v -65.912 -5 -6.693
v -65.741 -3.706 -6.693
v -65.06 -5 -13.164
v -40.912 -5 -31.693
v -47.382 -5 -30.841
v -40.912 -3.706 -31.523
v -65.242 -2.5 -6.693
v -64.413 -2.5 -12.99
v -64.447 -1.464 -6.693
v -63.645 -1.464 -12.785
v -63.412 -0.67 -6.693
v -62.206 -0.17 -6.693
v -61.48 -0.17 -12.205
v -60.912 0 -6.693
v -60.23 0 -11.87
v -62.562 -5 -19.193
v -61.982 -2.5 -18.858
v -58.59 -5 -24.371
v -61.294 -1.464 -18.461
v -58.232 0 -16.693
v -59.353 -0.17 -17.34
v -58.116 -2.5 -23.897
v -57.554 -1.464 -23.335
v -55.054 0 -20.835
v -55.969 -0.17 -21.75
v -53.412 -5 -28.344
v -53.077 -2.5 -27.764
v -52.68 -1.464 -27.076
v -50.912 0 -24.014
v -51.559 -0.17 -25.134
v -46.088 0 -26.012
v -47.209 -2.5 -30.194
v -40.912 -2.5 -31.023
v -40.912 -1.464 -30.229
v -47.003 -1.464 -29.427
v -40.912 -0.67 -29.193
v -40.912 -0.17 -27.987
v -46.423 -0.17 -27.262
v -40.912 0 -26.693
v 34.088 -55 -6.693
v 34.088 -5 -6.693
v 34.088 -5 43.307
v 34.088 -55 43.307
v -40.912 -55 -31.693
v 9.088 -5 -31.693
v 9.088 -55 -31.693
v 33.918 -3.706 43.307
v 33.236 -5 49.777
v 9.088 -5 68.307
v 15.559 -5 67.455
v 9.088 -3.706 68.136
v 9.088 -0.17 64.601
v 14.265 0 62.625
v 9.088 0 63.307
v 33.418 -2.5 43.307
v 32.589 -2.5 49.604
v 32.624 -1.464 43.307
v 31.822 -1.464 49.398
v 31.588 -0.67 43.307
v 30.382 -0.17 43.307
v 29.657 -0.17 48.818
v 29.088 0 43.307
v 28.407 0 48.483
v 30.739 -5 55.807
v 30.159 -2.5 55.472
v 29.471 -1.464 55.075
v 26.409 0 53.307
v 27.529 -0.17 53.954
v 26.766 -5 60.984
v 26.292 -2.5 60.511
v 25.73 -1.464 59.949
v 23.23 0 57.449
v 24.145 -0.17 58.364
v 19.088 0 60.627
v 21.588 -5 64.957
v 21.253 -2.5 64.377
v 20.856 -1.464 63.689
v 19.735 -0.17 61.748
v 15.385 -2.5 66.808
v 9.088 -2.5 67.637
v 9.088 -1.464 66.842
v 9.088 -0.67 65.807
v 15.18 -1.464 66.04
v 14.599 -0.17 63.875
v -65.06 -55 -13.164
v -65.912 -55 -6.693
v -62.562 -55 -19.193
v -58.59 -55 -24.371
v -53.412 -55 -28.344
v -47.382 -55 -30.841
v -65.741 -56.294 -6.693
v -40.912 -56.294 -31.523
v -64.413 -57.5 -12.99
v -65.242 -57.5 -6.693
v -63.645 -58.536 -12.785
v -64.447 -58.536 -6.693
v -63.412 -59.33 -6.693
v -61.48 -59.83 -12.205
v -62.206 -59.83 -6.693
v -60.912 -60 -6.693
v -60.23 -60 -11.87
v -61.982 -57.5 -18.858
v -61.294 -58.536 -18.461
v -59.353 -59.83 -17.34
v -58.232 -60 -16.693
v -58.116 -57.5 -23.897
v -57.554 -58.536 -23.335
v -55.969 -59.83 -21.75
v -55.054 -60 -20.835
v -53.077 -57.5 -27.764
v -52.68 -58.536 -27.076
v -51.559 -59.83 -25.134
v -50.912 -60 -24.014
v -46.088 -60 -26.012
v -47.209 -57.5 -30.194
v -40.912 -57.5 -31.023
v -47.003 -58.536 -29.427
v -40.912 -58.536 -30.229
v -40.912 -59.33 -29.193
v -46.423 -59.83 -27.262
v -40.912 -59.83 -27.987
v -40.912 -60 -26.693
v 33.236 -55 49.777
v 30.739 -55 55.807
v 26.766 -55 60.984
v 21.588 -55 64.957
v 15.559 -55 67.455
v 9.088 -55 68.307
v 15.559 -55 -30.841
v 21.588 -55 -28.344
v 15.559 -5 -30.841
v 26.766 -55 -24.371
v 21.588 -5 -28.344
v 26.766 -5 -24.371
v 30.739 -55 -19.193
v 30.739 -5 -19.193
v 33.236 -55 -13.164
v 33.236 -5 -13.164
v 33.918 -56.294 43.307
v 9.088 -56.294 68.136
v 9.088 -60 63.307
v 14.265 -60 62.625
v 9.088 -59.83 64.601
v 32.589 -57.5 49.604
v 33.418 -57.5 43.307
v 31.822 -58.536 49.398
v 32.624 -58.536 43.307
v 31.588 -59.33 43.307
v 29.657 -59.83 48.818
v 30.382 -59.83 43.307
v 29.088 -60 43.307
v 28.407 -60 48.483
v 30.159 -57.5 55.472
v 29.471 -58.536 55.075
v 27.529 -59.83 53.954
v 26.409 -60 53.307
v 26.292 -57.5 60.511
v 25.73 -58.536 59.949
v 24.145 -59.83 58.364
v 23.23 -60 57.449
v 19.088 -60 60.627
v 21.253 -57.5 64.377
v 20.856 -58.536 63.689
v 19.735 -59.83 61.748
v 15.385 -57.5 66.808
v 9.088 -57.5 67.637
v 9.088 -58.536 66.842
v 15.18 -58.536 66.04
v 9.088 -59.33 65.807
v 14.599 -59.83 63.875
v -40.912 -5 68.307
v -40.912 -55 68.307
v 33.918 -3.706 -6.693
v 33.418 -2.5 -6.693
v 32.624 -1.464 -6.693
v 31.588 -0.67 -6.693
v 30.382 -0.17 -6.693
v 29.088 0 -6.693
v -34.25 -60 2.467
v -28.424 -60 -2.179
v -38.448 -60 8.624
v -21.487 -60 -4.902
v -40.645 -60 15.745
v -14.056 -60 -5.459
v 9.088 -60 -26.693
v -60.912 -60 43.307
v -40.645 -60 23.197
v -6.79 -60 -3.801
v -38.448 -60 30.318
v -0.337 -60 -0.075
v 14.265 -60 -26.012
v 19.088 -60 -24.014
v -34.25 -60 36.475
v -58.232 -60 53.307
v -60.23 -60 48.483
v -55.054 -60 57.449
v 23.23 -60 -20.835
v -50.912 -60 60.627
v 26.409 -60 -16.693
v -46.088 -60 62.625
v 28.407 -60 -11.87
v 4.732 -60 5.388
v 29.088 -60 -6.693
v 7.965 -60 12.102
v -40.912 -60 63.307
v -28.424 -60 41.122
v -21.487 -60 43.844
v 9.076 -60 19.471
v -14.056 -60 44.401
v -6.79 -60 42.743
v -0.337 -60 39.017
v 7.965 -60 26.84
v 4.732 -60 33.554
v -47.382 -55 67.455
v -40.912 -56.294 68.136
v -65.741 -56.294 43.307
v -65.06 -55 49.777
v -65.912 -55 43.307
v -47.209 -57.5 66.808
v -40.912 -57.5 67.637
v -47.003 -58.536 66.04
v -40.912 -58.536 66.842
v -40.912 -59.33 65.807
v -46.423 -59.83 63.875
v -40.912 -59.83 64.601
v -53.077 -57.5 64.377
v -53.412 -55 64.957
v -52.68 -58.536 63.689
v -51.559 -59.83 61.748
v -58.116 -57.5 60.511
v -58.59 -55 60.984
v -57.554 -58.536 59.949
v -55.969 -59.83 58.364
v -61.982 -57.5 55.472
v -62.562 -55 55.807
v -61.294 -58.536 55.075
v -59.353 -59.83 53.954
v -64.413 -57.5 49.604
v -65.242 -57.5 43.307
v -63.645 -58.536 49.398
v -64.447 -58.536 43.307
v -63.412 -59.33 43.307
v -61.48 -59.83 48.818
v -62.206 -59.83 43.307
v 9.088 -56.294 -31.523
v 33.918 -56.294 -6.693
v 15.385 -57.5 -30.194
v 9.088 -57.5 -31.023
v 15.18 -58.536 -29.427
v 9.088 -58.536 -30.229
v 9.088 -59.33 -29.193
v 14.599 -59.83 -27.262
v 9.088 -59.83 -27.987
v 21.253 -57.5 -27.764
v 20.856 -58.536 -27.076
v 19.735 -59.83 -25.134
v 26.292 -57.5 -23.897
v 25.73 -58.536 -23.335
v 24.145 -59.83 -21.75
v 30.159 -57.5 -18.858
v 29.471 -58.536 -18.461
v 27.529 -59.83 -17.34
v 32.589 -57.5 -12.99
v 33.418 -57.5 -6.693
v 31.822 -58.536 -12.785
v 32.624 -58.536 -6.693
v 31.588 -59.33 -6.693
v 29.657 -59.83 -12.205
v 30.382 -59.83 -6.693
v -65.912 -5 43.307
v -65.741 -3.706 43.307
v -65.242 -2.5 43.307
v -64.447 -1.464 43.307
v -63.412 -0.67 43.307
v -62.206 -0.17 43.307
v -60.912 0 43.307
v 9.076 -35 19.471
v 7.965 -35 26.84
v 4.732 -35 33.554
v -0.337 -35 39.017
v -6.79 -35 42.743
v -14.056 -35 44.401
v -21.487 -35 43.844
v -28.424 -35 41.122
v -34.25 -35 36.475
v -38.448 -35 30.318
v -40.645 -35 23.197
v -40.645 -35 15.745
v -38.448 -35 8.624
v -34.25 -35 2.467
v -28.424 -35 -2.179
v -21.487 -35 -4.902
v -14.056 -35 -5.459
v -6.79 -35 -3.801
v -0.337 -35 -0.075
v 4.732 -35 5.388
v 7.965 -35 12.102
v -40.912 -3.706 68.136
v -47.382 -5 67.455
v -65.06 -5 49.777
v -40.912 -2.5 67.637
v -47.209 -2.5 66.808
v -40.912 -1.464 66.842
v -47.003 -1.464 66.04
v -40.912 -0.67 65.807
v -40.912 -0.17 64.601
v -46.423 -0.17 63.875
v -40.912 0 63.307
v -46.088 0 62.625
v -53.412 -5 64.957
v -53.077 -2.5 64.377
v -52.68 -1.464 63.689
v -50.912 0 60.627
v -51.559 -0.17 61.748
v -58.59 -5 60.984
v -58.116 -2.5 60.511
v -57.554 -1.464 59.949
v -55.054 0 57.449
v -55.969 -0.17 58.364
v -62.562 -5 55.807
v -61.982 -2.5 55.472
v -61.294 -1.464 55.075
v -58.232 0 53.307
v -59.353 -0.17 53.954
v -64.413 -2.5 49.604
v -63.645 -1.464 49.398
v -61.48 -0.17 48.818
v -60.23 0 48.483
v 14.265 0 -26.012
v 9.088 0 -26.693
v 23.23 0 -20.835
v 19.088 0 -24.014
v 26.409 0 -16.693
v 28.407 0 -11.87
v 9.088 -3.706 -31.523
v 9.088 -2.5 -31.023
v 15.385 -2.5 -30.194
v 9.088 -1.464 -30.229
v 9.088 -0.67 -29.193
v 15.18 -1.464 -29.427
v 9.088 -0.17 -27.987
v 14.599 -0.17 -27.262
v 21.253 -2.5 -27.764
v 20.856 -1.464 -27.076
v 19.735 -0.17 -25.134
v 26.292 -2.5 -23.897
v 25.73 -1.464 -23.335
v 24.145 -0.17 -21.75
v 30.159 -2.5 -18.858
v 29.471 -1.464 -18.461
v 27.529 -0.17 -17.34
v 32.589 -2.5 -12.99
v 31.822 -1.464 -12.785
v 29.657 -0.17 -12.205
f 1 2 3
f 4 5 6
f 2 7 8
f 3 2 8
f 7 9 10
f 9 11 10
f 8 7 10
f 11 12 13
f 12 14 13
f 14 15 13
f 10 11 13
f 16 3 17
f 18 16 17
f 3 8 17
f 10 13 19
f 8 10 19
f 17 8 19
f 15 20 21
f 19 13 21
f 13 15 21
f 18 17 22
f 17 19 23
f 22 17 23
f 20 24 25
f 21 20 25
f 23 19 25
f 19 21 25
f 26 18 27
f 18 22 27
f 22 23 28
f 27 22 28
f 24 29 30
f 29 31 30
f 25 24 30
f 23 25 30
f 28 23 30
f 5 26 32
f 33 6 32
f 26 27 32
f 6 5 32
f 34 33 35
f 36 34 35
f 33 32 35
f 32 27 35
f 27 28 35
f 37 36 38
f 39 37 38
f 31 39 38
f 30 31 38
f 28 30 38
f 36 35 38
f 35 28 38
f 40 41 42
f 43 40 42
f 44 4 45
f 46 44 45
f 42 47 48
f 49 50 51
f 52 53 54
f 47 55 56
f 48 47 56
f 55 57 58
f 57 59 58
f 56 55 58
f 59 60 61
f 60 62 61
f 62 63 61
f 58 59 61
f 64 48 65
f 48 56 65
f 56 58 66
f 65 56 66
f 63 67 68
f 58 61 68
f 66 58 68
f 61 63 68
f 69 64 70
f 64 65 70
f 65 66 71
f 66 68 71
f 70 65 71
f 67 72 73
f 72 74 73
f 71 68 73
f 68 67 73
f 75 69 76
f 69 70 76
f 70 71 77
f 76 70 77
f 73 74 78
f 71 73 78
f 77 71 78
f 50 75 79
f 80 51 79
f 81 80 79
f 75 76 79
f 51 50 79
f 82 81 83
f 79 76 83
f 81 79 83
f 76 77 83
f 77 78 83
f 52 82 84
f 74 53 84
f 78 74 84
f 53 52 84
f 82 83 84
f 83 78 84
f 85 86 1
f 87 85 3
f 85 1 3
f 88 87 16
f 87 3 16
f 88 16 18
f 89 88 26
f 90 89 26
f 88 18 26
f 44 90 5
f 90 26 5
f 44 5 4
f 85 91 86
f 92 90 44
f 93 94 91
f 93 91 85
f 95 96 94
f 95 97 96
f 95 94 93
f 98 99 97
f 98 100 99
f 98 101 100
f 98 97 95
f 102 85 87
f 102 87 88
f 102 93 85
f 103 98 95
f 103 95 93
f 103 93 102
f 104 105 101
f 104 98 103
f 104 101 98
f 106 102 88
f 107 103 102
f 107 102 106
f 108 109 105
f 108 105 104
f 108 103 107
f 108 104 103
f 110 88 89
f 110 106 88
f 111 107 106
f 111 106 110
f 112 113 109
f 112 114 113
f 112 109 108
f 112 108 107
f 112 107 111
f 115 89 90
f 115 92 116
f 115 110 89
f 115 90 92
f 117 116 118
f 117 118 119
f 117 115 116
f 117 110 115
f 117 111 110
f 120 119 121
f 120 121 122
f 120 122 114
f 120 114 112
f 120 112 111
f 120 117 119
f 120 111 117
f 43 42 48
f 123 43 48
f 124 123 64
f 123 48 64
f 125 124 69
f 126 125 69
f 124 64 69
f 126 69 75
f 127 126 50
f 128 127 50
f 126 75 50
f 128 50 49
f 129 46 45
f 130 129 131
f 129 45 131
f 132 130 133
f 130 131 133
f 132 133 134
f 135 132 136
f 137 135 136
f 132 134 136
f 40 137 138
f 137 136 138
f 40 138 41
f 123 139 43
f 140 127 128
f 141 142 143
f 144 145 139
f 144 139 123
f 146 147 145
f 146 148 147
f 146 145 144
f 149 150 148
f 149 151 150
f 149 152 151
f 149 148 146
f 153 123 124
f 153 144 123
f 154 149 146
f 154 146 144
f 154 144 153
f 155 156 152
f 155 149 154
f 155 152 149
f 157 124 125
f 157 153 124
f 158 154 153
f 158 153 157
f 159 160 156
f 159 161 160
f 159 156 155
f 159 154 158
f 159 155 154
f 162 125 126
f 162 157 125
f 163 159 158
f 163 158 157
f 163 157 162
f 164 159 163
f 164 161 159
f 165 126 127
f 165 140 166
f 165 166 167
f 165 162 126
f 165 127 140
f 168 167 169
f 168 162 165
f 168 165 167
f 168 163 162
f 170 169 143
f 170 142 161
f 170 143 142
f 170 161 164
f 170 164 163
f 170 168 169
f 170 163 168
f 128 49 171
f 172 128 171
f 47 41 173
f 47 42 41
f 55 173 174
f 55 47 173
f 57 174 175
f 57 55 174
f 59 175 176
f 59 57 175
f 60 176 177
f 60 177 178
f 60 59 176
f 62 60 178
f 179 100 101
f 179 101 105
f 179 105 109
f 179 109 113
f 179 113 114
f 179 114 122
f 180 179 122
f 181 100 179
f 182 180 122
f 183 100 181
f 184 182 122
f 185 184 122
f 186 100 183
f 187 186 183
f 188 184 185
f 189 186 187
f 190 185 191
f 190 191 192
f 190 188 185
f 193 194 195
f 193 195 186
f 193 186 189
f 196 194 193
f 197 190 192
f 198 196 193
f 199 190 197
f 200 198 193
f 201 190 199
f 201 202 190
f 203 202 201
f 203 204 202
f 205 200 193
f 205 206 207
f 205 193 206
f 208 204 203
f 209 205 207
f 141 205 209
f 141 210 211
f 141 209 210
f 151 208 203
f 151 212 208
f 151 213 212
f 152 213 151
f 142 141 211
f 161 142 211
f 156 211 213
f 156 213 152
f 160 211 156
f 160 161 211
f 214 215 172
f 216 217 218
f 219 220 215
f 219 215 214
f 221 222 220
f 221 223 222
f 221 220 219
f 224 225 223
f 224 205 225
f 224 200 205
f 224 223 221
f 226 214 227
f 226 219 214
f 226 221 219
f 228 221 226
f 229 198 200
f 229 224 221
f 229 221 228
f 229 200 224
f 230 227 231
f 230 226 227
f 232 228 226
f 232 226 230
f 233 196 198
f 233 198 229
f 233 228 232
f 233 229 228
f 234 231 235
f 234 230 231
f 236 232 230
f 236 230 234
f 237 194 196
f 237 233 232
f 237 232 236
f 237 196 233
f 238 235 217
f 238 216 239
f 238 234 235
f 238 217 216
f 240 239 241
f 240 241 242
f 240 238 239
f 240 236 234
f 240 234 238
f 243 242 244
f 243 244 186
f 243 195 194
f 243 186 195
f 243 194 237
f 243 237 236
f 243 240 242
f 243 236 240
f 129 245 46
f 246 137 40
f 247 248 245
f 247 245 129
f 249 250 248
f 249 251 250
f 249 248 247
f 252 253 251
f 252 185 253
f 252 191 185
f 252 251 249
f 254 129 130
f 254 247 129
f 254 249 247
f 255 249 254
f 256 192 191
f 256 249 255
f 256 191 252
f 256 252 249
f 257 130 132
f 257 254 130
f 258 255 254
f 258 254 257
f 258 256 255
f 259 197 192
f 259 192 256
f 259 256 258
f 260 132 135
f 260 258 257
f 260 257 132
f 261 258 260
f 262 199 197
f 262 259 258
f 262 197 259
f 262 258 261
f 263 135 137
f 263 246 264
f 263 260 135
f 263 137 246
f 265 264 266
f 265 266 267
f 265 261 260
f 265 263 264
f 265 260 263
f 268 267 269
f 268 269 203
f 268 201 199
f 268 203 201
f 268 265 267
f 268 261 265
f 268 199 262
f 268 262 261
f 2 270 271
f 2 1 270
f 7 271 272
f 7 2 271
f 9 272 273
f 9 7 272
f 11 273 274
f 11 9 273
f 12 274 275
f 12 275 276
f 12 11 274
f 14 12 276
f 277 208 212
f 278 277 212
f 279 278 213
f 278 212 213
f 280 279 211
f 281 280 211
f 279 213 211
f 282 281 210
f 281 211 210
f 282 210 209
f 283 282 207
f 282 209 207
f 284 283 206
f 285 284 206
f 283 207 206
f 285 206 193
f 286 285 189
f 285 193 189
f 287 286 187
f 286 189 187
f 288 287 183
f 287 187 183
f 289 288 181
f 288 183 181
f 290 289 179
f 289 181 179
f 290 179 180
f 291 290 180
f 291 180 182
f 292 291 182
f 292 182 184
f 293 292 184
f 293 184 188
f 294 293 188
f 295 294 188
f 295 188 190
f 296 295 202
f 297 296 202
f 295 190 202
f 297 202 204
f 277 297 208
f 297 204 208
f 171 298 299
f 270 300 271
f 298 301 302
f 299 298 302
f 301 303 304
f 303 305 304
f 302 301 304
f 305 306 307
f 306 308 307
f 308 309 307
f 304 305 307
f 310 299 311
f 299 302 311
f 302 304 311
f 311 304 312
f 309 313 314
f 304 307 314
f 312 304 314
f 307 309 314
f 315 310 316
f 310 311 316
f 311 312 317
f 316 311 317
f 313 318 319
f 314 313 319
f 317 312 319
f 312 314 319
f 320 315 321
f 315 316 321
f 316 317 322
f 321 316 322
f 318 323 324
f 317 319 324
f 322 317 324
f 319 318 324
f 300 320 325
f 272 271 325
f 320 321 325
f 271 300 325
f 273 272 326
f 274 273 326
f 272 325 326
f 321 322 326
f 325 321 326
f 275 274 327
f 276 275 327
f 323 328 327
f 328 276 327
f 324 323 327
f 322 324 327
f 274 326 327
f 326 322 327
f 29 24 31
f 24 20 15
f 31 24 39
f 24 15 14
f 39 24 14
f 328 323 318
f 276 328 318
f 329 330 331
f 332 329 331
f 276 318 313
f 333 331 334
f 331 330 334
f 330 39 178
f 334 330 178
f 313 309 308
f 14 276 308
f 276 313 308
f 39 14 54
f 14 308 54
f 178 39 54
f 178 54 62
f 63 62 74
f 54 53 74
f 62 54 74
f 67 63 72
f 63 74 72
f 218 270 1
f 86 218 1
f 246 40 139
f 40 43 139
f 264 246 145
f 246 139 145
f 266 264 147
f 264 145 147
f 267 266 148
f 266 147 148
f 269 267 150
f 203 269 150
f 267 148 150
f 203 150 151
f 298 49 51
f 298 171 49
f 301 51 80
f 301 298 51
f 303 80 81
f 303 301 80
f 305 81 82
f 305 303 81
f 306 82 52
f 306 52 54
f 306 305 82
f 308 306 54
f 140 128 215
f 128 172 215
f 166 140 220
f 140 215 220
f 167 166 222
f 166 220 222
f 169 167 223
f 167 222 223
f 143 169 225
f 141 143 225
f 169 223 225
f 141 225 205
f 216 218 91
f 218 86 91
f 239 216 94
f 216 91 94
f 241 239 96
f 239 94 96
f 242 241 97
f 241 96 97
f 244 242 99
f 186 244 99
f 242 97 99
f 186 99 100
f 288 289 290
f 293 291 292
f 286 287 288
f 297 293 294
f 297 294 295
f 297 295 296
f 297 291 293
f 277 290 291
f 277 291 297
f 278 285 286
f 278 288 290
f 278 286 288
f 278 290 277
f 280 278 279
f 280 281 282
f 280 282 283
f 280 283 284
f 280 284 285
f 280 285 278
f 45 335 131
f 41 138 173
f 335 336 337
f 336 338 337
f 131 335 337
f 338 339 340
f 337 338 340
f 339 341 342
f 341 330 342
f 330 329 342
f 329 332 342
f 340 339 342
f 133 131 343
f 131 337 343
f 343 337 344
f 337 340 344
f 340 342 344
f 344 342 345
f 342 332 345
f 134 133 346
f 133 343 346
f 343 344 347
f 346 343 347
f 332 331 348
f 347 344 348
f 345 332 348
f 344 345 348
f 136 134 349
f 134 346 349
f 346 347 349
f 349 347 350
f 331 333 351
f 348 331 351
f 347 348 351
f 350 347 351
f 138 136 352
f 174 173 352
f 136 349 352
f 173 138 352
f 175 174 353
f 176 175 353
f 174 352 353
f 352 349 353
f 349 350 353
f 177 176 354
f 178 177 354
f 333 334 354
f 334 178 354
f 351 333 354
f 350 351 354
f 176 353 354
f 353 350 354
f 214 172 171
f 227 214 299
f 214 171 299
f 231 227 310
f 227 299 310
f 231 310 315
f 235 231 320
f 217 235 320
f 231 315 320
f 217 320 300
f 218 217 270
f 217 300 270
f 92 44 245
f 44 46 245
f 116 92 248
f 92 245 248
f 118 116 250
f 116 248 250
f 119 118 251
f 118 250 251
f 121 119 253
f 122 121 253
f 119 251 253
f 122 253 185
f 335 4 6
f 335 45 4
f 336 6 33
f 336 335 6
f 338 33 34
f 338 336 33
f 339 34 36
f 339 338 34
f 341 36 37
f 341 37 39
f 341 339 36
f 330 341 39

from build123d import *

# Parameters (mm, degrees)
F1_DEPTH = 60
F2_R     = 5
F3_R     = 25
F4_DEPTH = 25


with BuildPart() as f1:
    # F0 (on Front) → F1 (new body)
    with BuildSketch(Plane.XZ):
        with BuildLine():
            Line((9.088148, 68.306795), (-40.911852, 68.306795))
            ThreePointArc((-40.911852, 68.306795), (-58.589521, 60.984465), (-65.911852, 43.306795))
            Line((-65.911852, 43.306795), (-65.911852, -6.693205))
            ThreePointArc((-65.911852, -6.693205), (-58.589521, -24.370874), (-40.911852, -31.693205))
            Line((-40.911852, -31.693205), (9.088148, -31.693205))
            ThreePointArc((9.088148, -31.693205), (26.765818, -24.370874), (34.088148, -6.693205))
            Line((34.088148, -6.693205), (34.088148, 43.306795))
            ThreePointArc((34.088148, 43.306795), (26.765818, 60.984465), (9.088148, 68.306795))
        make_face()
    extrude(amount=F1_DEPTH)

    # F2
    f2_edges = [f1.edges().sort_by_distance(p)[0] for p in [
        (-15.911852, -60, 68.306795),
        (-58.589521, -60, 60.984465),
        (-65.911852, -60, 18.306795),
        (-58.589521, -60, -24.370874),
        (-15.911852, -60, -31.693205),
        (26.765818, -60, -24.370874),
        (34.088148, -60, 18.306795),
        (26.765818, -60, 60.984465),
        (-15.911852, 0, 68.306795),
        (-58.589521, 0, 60.984465),
        (-65.911852, 0, 18.306795),
        (-58.589521, 0, -24.370874),
        (-15.911852, 0, -31.693205),
        (26.765818, 0, -24.370874),
        (34.088148, 0, 18.306795),
        (26.765818, 0, 60.984465),
    ]]
    fillet(f2_edges, radius=F2_R)

    # F3 (on face) → F4 (cut)
    with BuildSketch(Plane.XZ.offset(60)):
        with Locations((-15.923823, 19.471144)):
            Circle(F3_R)
    extrude(amount=-F4_DEPTH, mode=Mode.SUBTRACT)


solid = f1.part
